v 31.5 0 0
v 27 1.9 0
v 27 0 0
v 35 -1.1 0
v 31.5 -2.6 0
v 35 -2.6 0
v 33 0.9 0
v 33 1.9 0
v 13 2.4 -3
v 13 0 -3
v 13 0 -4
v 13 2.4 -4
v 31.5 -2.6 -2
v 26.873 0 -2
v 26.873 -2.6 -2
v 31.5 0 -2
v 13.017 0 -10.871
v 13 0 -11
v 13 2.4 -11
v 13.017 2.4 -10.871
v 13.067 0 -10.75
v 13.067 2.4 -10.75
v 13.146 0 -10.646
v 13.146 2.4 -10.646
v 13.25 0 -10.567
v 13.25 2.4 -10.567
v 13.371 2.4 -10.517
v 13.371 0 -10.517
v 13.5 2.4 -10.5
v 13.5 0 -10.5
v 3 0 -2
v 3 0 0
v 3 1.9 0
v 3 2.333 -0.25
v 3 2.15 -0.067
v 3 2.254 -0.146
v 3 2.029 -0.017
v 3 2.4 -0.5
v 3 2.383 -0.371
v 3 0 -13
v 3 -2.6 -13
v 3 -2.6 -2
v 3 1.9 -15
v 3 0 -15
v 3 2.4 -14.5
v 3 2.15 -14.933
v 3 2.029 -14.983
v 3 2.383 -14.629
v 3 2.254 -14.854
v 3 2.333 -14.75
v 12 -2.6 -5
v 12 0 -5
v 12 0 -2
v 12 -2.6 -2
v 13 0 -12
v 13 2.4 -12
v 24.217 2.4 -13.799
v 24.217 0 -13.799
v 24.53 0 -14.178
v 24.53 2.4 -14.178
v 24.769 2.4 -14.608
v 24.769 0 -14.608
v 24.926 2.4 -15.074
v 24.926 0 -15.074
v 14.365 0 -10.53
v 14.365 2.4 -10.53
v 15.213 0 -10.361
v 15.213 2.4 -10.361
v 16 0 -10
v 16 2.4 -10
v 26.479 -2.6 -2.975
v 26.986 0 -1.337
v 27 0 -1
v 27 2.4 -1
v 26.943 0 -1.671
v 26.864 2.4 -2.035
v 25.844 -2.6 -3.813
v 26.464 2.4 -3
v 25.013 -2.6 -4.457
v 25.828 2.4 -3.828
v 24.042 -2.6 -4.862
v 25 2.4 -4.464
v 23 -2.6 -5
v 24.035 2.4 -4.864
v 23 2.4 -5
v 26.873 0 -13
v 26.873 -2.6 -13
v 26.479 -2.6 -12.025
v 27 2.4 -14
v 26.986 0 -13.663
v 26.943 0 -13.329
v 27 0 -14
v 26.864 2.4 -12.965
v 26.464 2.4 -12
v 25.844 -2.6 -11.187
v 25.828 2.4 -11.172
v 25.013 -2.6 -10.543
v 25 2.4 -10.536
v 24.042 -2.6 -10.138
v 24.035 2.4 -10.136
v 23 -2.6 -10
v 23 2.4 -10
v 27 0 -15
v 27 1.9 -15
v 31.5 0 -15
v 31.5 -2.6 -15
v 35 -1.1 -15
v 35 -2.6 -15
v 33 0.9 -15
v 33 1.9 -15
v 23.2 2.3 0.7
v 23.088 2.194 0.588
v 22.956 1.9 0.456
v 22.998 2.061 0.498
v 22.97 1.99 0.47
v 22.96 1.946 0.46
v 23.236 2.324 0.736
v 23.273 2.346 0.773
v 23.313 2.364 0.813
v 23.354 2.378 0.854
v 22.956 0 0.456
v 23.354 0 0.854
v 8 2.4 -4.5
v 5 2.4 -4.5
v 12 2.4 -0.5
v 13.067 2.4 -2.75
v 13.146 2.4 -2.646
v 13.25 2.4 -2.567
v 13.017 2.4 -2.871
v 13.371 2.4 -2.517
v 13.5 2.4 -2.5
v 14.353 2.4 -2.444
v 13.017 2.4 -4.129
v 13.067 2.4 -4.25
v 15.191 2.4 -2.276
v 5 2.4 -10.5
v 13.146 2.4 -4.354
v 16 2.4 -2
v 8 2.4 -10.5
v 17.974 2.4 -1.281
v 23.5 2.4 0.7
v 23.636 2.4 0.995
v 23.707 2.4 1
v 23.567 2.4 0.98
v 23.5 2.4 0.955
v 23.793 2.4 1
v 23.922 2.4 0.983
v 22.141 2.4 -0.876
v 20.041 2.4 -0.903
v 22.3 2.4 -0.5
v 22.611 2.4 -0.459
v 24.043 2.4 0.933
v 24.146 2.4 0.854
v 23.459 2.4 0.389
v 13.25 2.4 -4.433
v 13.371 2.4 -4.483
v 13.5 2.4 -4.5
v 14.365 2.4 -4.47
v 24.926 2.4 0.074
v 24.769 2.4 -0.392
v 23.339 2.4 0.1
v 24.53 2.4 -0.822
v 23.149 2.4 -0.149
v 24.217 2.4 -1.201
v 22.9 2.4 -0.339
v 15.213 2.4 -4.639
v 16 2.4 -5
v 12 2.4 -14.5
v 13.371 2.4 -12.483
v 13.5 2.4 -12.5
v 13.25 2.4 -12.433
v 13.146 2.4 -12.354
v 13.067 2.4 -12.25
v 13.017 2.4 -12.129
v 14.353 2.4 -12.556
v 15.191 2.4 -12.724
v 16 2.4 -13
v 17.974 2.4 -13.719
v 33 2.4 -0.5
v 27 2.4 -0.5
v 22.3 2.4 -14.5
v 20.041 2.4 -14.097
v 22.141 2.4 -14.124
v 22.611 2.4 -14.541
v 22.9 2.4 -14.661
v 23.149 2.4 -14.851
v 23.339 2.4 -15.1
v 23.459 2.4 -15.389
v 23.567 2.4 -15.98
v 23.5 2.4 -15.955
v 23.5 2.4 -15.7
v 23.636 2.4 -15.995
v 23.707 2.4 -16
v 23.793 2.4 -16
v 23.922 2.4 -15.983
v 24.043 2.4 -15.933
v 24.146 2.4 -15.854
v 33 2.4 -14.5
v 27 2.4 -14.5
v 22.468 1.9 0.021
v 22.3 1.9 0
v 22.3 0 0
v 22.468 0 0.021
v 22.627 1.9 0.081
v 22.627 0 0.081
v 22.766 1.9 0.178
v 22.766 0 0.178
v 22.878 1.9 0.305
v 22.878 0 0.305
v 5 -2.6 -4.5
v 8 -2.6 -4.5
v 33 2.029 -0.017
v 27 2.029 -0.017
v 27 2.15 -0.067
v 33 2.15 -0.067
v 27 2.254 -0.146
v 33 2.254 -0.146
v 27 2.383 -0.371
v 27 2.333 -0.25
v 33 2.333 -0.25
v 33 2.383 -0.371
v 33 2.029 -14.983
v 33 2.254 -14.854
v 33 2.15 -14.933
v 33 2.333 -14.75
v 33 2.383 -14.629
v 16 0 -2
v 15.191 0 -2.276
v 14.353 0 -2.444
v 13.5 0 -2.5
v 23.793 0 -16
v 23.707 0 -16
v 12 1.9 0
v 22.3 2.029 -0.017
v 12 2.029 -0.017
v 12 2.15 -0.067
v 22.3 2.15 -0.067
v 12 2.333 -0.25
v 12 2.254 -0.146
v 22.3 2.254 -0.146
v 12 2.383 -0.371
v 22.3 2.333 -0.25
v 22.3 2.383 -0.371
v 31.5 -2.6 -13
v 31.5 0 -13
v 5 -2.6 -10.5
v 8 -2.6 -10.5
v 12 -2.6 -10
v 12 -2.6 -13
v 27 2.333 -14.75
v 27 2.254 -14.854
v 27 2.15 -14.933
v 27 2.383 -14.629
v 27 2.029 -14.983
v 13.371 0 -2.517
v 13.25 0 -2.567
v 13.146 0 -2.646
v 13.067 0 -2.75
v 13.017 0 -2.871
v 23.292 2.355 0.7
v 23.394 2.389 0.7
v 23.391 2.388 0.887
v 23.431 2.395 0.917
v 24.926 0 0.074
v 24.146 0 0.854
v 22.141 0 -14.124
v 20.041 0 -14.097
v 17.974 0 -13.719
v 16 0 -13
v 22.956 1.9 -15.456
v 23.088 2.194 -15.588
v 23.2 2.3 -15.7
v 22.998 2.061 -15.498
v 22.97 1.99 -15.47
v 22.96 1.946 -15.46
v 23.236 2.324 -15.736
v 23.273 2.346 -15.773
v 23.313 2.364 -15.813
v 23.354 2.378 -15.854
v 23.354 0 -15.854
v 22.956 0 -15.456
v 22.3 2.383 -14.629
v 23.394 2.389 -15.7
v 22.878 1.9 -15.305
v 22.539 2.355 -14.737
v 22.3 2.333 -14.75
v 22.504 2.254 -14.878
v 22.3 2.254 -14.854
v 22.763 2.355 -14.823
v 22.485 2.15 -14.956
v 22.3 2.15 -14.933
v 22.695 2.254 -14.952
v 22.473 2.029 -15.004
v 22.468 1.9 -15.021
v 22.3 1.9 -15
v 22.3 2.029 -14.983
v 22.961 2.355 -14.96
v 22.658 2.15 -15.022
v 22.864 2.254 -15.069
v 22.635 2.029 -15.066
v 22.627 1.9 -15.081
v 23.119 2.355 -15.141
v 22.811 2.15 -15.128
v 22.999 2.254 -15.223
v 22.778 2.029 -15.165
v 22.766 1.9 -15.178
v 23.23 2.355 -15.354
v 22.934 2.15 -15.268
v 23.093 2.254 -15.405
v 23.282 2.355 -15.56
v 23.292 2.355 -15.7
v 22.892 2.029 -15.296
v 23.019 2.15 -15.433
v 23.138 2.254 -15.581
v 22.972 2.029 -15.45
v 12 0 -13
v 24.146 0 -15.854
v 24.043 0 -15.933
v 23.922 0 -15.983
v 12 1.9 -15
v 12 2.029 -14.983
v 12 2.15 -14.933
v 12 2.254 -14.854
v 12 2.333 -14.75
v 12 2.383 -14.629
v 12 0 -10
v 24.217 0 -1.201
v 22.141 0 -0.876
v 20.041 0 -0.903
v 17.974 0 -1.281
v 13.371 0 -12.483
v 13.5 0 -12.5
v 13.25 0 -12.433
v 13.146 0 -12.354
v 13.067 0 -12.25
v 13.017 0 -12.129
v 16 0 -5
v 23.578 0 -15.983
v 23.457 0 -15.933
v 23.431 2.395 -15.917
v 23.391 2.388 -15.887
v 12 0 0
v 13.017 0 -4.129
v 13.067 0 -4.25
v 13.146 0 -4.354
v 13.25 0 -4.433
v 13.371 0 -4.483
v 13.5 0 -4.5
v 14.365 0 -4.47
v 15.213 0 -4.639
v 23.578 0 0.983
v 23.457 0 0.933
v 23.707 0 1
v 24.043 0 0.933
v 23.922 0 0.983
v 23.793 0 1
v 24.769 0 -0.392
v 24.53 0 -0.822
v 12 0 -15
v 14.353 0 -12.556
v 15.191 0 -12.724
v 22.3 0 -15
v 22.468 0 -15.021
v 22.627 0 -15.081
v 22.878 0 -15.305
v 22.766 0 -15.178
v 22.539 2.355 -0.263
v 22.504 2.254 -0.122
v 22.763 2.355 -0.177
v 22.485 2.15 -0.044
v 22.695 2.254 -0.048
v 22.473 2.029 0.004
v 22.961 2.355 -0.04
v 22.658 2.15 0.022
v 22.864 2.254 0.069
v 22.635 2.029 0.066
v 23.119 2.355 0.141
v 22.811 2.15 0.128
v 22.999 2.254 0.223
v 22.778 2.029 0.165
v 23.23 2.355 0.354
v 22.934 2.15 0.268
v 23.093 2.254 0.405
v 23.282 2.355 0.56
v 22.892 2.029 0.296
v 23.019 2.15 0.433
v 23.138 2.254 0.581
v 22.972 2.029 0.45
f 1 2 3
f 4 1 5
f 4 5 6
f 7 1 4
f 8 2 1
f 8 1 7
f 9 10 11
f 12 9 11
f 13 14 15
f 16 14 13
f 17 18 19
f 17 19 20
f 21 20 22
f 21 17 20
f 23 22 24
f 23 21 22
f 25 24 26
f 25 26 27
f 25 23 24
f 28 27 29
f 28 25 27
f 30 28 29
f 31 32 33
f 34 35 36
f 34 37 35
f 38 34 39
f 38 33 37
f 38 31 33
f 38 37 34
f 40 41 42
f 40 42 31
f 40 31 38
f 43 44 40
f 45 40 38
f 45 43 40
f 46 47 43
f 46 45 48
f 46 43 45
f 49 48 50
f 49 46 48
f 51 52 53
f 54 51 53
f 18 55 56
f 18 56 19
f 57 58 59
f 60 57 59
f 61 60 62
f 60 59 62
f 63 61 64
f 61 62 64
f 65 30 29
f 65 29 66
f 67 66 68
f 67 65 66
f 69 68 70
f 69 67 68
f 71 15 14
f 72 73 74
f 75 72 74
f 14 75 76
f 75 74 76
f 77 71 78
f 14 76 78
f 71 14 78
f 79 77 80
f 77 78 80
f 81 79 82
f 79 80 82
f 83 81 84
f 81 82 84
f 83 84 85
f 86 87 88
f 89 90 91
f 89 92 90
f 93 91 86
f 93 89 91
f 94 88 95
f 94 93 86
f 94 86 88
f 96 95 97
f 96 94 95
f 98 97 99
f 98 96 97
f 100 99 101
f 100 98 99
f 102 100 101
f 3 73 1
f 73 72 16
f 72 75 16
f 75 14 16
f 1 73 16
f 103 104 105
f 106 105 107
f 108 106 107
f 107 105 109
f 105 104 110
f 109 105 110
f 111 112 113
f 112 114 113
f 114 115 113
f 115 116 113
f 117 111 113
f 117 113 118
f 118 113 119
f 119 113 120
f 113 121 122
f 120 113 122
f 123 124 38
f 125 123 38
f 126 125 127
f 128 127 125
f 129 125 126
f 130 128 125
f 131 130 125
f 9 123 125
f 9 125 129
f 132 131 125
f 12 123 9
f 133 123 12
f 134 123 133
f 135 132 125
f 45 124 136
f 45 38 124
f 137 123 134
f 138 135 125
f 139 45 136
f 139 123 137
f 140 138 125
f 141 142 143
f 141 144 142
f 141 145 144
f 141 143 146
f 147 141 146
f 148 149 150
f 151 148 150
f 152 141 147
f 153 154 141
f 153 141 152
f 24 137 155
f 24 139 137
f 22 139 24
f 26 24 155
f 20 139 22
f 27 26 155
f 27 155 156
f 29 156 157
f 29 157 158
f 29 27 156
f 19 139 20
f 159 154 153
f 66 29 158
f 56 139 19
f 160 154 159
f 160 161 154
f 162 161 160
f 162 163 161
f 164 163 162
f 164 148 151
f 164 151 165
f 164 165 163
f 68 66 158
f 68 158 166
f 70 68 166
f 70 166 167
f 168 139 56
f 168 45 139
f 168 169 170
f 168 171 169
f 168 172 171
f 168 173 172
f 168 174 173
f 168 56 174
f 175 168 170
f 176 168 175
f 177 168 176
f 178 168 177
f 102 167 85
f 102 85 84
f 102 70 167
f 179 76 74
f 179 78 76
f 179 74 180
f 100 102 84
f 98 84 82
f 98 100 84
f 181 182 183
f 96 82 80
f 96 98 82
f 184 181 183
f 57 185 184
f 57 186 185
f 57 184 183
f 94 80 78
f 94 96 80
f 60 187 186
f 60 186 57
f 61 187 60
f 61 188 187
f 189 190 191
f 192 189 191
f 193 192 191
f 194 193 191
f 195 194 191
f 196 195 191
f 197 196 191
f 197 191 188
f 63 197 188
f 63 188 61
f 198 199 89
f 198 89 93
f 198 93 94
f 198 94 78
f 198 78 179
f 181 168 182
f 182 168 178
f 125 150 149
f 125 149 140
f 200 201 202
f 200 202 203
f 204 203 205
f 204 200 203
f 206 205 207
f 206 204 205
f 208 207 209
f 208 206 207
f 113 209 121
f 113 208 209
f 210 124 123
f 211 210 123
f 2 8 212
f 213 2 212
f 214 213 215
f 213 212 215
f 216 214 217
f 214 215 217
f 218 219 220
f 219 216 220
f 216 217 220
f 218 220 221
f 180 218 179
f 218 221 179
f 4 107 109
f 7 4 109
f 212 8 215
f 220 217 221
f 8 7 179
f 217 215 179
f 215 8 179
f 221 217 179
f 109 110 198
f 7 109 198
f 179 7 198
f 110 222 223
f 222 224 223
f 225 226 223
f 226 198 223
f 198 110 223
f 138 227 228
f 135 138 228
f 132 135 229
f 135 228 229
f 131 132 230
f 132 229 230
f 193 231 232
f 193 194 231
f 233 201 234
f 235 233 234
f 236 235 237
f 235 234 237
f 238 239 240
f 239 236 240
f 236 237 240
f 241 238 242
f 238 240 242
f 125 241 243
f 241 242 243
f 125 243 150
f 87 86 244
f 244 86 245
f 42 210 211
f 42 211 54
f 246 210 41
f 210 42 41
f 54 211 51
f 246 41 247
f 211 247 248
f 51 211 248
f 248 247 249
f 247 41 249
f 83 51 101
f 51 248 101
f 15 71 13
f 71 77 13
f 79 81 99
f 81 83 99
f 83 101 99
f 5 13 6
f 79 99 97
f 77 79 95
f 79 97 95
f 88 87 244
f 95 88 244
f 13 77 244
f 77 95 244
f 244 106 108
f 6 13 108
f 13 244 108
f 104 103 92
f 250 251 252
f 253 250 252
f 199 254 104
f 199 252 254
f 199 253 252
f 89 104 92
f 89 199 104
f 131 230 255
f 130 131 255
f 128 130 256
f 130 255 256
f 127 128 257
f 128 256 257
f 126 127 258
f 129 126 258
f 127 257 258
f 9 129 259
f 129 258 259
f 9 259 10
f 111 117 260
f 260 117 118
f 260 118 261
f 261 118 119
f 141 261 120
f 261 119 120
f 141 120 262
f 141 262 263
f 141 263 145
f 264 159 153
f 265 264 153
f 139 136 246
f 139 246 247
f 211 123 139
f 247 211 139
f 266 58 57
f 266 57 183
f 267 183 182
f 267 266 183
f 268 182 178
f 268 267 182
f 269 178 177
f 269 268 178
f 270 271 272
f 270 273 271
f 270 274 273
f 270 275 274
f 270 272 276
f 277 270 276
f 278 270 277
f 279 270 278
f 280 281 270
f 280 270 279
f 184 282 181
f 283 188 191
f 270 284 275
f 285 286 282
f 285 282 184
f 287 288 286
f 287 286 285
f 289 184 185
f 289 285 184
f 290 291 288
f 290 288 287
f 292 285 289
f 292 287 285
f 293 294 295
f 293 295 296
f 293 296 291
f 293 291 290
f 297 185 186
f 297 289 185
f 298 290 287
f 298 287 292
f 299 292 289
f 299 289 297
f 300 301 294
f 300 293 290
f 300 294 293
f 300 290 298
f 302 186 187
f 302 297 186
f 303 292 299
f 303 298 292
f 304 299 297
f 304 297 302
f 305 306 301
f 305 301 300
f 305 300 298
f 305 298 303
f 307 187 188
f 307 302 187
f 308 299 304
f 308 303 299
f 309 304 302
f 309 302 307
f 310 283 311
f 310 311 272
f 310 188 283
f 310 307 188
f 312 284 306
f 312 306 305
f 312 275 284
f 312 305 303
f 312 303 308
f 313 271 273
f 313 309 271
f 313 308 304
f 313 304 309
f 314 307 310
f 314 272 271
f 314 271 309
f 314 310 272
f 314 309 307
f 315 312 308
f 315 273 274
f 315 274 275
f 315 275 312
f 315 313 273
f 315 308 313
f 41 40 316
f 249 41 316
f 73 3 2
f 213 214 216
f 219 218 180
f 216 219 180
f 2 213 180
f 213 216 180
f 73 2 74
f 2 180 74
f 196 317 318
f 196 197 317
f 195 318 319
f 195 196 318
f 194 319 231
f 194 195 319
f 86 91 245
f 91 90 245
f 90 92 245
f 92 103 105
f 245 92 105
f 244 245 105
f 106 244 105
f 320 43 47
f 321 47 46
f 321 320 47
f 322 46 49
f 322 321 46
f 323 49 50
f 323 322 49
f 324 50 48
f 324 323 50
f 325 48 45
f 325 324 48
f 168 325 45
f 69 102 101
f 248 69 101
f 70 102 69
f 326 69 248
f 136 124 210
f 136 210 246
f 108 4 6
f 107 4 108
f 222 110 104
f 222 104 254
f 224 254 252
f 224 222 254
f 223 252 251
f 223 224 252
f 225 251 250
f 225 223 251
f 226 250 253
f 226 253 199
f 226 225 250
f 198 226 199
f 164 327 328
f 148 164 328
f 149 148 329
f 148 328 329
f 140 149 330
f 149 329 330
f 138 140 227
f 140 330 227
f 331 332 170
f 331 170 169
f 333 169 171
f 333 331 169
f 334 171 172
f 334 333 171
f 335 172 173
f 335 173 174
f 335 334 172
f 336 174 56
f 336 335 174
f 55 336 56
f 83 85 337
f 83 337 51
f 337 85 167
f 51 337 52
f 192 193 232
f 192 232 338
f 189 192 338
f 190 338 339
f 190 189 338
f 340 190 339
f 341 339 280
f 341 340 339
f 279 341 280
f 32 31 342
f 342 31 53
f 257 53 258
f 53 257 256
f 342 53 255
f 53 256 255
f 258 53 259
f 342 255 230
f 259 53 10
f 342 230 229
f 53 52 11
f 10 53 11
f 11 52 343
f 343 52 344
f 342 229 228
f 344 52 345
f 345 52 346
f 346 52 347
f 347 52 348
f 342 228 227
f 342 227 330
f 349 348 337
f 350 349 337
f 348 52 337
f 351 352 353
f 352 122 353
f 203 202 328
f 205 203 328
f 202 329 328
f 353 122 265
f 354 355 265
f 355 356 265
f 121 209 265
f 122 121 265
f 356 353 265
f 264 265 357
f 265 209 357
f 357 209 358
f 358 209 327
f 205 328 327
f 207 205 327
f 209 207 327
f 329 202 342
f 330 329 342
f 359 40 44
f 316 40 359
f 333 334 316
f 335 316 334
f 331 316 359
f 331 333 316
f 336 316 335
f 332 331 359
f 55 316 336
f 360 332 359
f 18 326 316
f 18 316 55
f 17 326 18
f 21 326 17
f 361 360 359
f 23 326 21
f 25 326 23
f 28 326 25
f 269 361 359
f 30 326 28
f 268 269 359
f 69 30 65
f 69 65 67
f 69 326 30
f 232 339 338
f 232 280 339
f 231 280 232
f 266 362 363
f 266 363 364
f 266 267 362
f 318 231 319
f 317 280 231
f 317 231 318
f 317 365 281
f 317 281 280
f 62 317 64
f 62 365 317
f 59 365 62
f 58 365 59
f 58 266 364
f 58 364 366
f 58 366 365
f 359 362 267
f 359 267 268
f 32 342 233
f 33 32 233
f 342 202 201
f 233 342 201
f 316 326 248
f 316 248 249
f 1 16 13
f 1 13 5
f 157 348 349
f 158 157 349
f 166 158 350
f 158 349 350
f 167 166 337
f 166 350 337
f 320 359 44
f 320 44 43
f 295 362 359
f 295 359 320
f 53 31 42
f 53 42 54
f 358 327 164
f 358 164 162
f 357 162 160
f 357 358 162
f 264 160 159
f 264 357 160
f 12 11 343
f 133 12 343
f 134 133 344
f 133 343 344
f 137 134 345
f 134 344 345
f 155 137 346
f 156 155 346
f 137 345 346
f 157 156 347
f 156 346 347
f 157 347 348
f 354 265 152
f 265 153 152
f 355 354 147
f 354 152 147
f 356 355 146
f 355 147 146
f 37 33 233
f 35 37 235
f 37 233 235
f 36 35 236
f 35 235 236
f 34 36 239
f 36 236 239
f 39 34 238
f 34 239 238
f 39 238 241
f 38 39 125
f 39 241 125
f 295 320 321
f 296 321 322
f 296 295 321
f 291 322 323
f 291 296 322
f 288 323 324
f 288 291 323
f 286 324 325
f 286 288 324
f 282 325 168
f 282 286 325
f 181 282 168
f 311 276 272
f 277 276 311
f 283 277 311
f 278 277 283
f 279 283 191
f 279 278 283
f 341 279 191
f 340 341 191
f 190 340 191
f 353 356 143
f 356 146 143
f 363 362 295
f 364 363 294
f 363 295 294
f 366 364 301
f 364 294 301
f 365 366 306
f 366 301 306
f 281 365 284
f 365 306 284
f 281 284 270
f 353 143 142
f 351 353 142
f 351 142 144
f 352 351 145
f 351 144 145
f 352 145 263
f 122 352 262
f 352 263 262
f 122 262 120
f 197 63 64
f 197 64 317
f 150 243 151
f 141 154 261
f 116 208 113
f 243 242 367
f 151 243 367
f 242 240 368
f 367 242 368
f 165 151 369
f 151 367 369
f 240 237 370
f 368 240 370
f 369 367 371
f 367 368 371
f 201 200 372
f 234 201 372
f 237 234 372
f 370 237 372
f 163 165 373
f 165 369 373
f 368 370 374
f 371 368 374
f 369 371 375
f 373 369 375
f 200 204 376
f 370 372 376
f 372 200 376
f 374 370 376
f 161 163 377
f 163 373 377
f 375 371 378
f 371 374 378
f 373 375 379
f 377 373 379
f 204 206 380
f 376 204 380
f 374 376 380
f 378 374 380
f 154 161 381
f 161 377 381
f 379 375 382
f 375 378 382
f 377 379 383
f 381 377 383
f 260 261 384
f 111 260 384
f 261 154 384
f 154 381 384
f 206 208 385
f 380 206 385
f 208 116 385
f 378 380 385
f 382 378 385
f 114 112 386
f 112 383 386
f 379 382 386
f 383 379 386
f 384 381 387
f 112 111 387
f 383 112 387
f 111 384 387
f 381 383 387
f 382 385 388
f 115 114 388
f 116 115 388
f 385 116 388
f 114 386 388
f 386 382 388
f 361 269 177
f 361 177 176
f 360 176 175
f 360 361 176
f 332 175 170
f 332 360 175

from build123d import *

# Parameters (mm, degrees)
SKETCH_1_W             = 35
SKETCH_1_H             = 15
EXTRUDE_1_DEPTH        = 2.4
FILLET_1_R             = 0.5
SKETCH_2_W             = 35
SKETCH_2_H             = 11
EXTRUDE_2_DEPTH        = 2.6
SKETCH_3_W             = 3.5
SKETCH_3_H             = 2
EXTRUDE_3_DEPTH        = 2.6
CUT_EXTRUDE_1_DEPTH    = 15
CUT_EXTRUDE_2_DEPTH    = 5
CUT_EXTRUDE_3_DEPTH    = 2.4
EXTRUDE_4_DEPTH        = 2.4
CUT_EXTRUDE_4_DEPTH    = 2.4
FILLET_2_R             = 0.5
FILLET_2_OF_MIRROR_2_R = 0.5
SKETCH_17_W            = 3
SKETCH_17_H            = 5
CUT_EXTRUDE_5_DEPTH    = 15
SKETCH_18_W            = 3
SKETCH_18_H            = 6
CUT_EXTRUDE_6_DEPTH    = 5


with BuildPart() as part:
    # 草图1 → 凸台-拉伸1 (new body)
    with BuildSketch(Plane(origin=(0, 0, 0), x_dir=(1, 0, 0), z_dir=(0, 1, 0))):
        with Locations((17.5, 7.5)):
            Rectangle(SKETCH_1_W, SKETCH_1_H)
    extrude(amount=EXTRUDE_1_DEPTH)

    # 圆角1
    fillet_1_edges = [part.edges().sort_by_distance(p)[0] for p in [
        (17.5, 2.4, -15),
        (17.5, 2.4, 0),
    ]]
    fillet(fillet_1_edges, radius=FILLET_1_R)

    # 草图2 → 凸台-拉伸2 (add)
    with BuildSketch(Plane.XZ):
        with Locations((17.5, -7.5)):
            Rectangle(SKETCH_2_W, SKETCH_2_H)
    extrude(amount=EXTRUDE_2_DEPTH)

    # 草图3 → 凸台-拉伸3 (add)
    with BuildSketch(Plane.XZ):
        with Locations((33.25, -1)):
            Rectangle(SKETCH_3_W, SKETCH_3_H)
    extrude_3 = extrude(amount=EXTRUDE_3_DEPTH)

    # 镜向1: 凸台-拉伸3 across plane
    add(extrude_3.mirror(Plane(origin=(0, 0, -7.5), x_dir=(1, 0, 0), z_dir=(0, 0, -1))))

    # 草图4 → 切除-拉伸1 (cut)
    with BuildSketch(Plane(origin=(0, 0, -15), x_dir=(-1, 0, 0), z_dir=(0, 0, -1))):
        Polygon((-35, -1.1), (-33, 0.9), (-33, 2.4), (-35, 2.4), align=None)
    extrude(amount=-CUT_EXTRUDE_1_DEPTH, mode=Mode.SUBTRACT)

    # 草图6 → 切除-拉伸2 (cut)
    with BuildSketch(Plane(origin=(0, 2.4, 0), x_dir=(1, 0, 0), z_dir=(0, 1, 0))):
        with BuildLine():
            Line((12, 15), (27, 15))
            Line((27, 15), (27, 14))
            ThreePointArc((27, 14), (25.828427125, 11.171572875), (23, 10))
            Line((23, 10), (12, 10))
            Line((12, 10), (12, 15))
        make_face()
    cut_extrude_2 = extrude(amount=-CUT_EXTRUDE_2_DEPTH, mode=Mode.SUBTRACT)

    # 扫描4: sweep along a path in 草图13
    with BuildLine(Plane(origin=(0, 2.4, 0), x_dir=(1, 0, 0), z_dir=(0, 1, 0))) as sweep_4_path:
        Line((12, 14.5), (22.3, 14.5))
        ThreePointArc((22.3, 14.5), (23.148528137, 14.851471863), (23.5, 15.7))
        Line((23.5, 15.7), (23.5, 16))
    # 草图10 → 扫描4 (sweep)
    with BuildSketch(Plane(origin=(0, 0, -16), x_dir=(-1, 0, 0), z_dir=(0, 0, -1))):
        with BuildLine():
            Line((-25, 2.4), (-23.5, 2.4))
            ThreePointArc((-23.5, 2.4), (-23.146446609, 2.253553391), (-23, 1.9))
            Line((-23, 1.9), (-23, 0))
            Line((-23, 0), (-25, 0))
            Line((-25, 0), (-25, 2.4))
        make_face()
    sweep_4 = sweep(path=sweep_4_path.line)

    # 草图14 → 切除-拉伸3 (cut)
    with BuildSketch(Plane.XZ):
        Polygon((22.721496019, -16), (22.721496019, -15.221496019), (23.5, -16), align=None)
        Polygon((25.109405679, -16), (25.109405679, -14.890594321), (24, -16), align=None)
    cut_extrude_3 = extrude(amount=-CUT_EXTRUDE_3_DEPTH, mode=Mode.SUBTRACT)

    # 草图15 → 凸台-拉伸4 (add)
    with BuildSketch(Plane.XZ):
        with BuildLine():
            Line((12, -10), (12, -13))
            Line((12, -13), (16, -13))
            ThreePointArc((16, -13), (14.774754878, -12.626225608), (13.5, -12.5))
            ThreePointArc((13.5, -12.5), (13.146446609, -12.353553391), (13, -12))
            Line((13, -12), (13, -11))
            ThreePointArc((13, -11), (13.146446609, -10.646446609), (13.5, -10.5))
            ThreePointArc((13.5, -10.5), (14.794008988, -10.470044942), (16, -10))
            Line((16, -10), (12, -10))
        make_face()
    extrude_4 = extrude(amount=-EXTRUDE_4_DEPTH)

    # 草图16 → 切除-拉伸4 (cut)
    with BuildSketch(Plane.XZ):
        with BuildLine():
            Line((16, -13), (22.3, -13))
            ThreePointArc((22.3, -13), (23.338390931, -13.207662889), (24.217052039, -13.798707945))
            ThreePointArc((24.217052039, -13.798707945), (20.040683481, -14.097313313), (16, -13))
        make_face()
    cut_extrude_4 = extrude(amount=-CUT_EXTRUDE_4_DEPTH, mode=Mode.SUBTRACT)

    # 圆角2
    fillet_2_edges = [part.edges().sort_by_distance(p)[0] for p in [
        (23.5, 1.2, -16),
        (24, 1.2, -16),
    ]]
    fillet(fillet_2_edges, radius=FILLET_2_R)

    # 镜向2: 切除-拉伸2, 扫描4, 切除-拉伸3, 凸台-拉伸4, 切除-拉伸4 across plane
    add(cut_extrude_2.mirror(Plane.XY.offset(-7.5)), mode=Mode.SUBTRACT)
    add(sweep_4.mirror(Plane.XY.offset(-7.5)))
    add(cut_extrude_3.mirror(Plane.XY.offset(-7.5)), mode=Mode.SUBTRACT)
    add(extrude_4.mirror(Plane.XY.offset(-7.5)))
    add(cut_extrude_4.mirror(Plane.XY.offset(-7.5)), mode=Mode.SUBTRACT)

    # 圆角2 of 镜向2
    fillet_2_of_mirror_2_edges = [part.edges().sort_by_distance(p)[0] for p in [
        (23.5, 1.2, 1),
        (24, 1.2, 1),
    ]]
    fillet(fillet_2_of_mirror_2_edges, radius=FILLET_2_OF_MIRROR_2_R)

    # 草图17 → 切除-拉伸5 (cut)
    with BuildSketch(Plane(origin=(0, 0, -15), x_dir=(-1, 0, 0), z_dir=(0, 0, -1))):
        with Locations((-1.5, -0.1)):
            Rectangle(SKETCH_17_W, SKETCH_17_H)
    extrude(amount=-CUT_EXTRUDE_5_DEPTH, mode=Mode.SUBTRACT)

    # 草图18 → 切除-拉伸6 (cut)
    with BuildSketch(Plane(origin=(0, 2.4, 0), x_dir=(1, 0, 0), z_dir=(0, 1, 0))):
        with Locations((6.5, 7.5)):
            Rectangle(SKETCH_18_W, SKETCH_18_H)
    extrude(amount=-CUT_EXTRUDE_6_DEPTH, mode=Mode.SUBTRACT)


solid = part.part
